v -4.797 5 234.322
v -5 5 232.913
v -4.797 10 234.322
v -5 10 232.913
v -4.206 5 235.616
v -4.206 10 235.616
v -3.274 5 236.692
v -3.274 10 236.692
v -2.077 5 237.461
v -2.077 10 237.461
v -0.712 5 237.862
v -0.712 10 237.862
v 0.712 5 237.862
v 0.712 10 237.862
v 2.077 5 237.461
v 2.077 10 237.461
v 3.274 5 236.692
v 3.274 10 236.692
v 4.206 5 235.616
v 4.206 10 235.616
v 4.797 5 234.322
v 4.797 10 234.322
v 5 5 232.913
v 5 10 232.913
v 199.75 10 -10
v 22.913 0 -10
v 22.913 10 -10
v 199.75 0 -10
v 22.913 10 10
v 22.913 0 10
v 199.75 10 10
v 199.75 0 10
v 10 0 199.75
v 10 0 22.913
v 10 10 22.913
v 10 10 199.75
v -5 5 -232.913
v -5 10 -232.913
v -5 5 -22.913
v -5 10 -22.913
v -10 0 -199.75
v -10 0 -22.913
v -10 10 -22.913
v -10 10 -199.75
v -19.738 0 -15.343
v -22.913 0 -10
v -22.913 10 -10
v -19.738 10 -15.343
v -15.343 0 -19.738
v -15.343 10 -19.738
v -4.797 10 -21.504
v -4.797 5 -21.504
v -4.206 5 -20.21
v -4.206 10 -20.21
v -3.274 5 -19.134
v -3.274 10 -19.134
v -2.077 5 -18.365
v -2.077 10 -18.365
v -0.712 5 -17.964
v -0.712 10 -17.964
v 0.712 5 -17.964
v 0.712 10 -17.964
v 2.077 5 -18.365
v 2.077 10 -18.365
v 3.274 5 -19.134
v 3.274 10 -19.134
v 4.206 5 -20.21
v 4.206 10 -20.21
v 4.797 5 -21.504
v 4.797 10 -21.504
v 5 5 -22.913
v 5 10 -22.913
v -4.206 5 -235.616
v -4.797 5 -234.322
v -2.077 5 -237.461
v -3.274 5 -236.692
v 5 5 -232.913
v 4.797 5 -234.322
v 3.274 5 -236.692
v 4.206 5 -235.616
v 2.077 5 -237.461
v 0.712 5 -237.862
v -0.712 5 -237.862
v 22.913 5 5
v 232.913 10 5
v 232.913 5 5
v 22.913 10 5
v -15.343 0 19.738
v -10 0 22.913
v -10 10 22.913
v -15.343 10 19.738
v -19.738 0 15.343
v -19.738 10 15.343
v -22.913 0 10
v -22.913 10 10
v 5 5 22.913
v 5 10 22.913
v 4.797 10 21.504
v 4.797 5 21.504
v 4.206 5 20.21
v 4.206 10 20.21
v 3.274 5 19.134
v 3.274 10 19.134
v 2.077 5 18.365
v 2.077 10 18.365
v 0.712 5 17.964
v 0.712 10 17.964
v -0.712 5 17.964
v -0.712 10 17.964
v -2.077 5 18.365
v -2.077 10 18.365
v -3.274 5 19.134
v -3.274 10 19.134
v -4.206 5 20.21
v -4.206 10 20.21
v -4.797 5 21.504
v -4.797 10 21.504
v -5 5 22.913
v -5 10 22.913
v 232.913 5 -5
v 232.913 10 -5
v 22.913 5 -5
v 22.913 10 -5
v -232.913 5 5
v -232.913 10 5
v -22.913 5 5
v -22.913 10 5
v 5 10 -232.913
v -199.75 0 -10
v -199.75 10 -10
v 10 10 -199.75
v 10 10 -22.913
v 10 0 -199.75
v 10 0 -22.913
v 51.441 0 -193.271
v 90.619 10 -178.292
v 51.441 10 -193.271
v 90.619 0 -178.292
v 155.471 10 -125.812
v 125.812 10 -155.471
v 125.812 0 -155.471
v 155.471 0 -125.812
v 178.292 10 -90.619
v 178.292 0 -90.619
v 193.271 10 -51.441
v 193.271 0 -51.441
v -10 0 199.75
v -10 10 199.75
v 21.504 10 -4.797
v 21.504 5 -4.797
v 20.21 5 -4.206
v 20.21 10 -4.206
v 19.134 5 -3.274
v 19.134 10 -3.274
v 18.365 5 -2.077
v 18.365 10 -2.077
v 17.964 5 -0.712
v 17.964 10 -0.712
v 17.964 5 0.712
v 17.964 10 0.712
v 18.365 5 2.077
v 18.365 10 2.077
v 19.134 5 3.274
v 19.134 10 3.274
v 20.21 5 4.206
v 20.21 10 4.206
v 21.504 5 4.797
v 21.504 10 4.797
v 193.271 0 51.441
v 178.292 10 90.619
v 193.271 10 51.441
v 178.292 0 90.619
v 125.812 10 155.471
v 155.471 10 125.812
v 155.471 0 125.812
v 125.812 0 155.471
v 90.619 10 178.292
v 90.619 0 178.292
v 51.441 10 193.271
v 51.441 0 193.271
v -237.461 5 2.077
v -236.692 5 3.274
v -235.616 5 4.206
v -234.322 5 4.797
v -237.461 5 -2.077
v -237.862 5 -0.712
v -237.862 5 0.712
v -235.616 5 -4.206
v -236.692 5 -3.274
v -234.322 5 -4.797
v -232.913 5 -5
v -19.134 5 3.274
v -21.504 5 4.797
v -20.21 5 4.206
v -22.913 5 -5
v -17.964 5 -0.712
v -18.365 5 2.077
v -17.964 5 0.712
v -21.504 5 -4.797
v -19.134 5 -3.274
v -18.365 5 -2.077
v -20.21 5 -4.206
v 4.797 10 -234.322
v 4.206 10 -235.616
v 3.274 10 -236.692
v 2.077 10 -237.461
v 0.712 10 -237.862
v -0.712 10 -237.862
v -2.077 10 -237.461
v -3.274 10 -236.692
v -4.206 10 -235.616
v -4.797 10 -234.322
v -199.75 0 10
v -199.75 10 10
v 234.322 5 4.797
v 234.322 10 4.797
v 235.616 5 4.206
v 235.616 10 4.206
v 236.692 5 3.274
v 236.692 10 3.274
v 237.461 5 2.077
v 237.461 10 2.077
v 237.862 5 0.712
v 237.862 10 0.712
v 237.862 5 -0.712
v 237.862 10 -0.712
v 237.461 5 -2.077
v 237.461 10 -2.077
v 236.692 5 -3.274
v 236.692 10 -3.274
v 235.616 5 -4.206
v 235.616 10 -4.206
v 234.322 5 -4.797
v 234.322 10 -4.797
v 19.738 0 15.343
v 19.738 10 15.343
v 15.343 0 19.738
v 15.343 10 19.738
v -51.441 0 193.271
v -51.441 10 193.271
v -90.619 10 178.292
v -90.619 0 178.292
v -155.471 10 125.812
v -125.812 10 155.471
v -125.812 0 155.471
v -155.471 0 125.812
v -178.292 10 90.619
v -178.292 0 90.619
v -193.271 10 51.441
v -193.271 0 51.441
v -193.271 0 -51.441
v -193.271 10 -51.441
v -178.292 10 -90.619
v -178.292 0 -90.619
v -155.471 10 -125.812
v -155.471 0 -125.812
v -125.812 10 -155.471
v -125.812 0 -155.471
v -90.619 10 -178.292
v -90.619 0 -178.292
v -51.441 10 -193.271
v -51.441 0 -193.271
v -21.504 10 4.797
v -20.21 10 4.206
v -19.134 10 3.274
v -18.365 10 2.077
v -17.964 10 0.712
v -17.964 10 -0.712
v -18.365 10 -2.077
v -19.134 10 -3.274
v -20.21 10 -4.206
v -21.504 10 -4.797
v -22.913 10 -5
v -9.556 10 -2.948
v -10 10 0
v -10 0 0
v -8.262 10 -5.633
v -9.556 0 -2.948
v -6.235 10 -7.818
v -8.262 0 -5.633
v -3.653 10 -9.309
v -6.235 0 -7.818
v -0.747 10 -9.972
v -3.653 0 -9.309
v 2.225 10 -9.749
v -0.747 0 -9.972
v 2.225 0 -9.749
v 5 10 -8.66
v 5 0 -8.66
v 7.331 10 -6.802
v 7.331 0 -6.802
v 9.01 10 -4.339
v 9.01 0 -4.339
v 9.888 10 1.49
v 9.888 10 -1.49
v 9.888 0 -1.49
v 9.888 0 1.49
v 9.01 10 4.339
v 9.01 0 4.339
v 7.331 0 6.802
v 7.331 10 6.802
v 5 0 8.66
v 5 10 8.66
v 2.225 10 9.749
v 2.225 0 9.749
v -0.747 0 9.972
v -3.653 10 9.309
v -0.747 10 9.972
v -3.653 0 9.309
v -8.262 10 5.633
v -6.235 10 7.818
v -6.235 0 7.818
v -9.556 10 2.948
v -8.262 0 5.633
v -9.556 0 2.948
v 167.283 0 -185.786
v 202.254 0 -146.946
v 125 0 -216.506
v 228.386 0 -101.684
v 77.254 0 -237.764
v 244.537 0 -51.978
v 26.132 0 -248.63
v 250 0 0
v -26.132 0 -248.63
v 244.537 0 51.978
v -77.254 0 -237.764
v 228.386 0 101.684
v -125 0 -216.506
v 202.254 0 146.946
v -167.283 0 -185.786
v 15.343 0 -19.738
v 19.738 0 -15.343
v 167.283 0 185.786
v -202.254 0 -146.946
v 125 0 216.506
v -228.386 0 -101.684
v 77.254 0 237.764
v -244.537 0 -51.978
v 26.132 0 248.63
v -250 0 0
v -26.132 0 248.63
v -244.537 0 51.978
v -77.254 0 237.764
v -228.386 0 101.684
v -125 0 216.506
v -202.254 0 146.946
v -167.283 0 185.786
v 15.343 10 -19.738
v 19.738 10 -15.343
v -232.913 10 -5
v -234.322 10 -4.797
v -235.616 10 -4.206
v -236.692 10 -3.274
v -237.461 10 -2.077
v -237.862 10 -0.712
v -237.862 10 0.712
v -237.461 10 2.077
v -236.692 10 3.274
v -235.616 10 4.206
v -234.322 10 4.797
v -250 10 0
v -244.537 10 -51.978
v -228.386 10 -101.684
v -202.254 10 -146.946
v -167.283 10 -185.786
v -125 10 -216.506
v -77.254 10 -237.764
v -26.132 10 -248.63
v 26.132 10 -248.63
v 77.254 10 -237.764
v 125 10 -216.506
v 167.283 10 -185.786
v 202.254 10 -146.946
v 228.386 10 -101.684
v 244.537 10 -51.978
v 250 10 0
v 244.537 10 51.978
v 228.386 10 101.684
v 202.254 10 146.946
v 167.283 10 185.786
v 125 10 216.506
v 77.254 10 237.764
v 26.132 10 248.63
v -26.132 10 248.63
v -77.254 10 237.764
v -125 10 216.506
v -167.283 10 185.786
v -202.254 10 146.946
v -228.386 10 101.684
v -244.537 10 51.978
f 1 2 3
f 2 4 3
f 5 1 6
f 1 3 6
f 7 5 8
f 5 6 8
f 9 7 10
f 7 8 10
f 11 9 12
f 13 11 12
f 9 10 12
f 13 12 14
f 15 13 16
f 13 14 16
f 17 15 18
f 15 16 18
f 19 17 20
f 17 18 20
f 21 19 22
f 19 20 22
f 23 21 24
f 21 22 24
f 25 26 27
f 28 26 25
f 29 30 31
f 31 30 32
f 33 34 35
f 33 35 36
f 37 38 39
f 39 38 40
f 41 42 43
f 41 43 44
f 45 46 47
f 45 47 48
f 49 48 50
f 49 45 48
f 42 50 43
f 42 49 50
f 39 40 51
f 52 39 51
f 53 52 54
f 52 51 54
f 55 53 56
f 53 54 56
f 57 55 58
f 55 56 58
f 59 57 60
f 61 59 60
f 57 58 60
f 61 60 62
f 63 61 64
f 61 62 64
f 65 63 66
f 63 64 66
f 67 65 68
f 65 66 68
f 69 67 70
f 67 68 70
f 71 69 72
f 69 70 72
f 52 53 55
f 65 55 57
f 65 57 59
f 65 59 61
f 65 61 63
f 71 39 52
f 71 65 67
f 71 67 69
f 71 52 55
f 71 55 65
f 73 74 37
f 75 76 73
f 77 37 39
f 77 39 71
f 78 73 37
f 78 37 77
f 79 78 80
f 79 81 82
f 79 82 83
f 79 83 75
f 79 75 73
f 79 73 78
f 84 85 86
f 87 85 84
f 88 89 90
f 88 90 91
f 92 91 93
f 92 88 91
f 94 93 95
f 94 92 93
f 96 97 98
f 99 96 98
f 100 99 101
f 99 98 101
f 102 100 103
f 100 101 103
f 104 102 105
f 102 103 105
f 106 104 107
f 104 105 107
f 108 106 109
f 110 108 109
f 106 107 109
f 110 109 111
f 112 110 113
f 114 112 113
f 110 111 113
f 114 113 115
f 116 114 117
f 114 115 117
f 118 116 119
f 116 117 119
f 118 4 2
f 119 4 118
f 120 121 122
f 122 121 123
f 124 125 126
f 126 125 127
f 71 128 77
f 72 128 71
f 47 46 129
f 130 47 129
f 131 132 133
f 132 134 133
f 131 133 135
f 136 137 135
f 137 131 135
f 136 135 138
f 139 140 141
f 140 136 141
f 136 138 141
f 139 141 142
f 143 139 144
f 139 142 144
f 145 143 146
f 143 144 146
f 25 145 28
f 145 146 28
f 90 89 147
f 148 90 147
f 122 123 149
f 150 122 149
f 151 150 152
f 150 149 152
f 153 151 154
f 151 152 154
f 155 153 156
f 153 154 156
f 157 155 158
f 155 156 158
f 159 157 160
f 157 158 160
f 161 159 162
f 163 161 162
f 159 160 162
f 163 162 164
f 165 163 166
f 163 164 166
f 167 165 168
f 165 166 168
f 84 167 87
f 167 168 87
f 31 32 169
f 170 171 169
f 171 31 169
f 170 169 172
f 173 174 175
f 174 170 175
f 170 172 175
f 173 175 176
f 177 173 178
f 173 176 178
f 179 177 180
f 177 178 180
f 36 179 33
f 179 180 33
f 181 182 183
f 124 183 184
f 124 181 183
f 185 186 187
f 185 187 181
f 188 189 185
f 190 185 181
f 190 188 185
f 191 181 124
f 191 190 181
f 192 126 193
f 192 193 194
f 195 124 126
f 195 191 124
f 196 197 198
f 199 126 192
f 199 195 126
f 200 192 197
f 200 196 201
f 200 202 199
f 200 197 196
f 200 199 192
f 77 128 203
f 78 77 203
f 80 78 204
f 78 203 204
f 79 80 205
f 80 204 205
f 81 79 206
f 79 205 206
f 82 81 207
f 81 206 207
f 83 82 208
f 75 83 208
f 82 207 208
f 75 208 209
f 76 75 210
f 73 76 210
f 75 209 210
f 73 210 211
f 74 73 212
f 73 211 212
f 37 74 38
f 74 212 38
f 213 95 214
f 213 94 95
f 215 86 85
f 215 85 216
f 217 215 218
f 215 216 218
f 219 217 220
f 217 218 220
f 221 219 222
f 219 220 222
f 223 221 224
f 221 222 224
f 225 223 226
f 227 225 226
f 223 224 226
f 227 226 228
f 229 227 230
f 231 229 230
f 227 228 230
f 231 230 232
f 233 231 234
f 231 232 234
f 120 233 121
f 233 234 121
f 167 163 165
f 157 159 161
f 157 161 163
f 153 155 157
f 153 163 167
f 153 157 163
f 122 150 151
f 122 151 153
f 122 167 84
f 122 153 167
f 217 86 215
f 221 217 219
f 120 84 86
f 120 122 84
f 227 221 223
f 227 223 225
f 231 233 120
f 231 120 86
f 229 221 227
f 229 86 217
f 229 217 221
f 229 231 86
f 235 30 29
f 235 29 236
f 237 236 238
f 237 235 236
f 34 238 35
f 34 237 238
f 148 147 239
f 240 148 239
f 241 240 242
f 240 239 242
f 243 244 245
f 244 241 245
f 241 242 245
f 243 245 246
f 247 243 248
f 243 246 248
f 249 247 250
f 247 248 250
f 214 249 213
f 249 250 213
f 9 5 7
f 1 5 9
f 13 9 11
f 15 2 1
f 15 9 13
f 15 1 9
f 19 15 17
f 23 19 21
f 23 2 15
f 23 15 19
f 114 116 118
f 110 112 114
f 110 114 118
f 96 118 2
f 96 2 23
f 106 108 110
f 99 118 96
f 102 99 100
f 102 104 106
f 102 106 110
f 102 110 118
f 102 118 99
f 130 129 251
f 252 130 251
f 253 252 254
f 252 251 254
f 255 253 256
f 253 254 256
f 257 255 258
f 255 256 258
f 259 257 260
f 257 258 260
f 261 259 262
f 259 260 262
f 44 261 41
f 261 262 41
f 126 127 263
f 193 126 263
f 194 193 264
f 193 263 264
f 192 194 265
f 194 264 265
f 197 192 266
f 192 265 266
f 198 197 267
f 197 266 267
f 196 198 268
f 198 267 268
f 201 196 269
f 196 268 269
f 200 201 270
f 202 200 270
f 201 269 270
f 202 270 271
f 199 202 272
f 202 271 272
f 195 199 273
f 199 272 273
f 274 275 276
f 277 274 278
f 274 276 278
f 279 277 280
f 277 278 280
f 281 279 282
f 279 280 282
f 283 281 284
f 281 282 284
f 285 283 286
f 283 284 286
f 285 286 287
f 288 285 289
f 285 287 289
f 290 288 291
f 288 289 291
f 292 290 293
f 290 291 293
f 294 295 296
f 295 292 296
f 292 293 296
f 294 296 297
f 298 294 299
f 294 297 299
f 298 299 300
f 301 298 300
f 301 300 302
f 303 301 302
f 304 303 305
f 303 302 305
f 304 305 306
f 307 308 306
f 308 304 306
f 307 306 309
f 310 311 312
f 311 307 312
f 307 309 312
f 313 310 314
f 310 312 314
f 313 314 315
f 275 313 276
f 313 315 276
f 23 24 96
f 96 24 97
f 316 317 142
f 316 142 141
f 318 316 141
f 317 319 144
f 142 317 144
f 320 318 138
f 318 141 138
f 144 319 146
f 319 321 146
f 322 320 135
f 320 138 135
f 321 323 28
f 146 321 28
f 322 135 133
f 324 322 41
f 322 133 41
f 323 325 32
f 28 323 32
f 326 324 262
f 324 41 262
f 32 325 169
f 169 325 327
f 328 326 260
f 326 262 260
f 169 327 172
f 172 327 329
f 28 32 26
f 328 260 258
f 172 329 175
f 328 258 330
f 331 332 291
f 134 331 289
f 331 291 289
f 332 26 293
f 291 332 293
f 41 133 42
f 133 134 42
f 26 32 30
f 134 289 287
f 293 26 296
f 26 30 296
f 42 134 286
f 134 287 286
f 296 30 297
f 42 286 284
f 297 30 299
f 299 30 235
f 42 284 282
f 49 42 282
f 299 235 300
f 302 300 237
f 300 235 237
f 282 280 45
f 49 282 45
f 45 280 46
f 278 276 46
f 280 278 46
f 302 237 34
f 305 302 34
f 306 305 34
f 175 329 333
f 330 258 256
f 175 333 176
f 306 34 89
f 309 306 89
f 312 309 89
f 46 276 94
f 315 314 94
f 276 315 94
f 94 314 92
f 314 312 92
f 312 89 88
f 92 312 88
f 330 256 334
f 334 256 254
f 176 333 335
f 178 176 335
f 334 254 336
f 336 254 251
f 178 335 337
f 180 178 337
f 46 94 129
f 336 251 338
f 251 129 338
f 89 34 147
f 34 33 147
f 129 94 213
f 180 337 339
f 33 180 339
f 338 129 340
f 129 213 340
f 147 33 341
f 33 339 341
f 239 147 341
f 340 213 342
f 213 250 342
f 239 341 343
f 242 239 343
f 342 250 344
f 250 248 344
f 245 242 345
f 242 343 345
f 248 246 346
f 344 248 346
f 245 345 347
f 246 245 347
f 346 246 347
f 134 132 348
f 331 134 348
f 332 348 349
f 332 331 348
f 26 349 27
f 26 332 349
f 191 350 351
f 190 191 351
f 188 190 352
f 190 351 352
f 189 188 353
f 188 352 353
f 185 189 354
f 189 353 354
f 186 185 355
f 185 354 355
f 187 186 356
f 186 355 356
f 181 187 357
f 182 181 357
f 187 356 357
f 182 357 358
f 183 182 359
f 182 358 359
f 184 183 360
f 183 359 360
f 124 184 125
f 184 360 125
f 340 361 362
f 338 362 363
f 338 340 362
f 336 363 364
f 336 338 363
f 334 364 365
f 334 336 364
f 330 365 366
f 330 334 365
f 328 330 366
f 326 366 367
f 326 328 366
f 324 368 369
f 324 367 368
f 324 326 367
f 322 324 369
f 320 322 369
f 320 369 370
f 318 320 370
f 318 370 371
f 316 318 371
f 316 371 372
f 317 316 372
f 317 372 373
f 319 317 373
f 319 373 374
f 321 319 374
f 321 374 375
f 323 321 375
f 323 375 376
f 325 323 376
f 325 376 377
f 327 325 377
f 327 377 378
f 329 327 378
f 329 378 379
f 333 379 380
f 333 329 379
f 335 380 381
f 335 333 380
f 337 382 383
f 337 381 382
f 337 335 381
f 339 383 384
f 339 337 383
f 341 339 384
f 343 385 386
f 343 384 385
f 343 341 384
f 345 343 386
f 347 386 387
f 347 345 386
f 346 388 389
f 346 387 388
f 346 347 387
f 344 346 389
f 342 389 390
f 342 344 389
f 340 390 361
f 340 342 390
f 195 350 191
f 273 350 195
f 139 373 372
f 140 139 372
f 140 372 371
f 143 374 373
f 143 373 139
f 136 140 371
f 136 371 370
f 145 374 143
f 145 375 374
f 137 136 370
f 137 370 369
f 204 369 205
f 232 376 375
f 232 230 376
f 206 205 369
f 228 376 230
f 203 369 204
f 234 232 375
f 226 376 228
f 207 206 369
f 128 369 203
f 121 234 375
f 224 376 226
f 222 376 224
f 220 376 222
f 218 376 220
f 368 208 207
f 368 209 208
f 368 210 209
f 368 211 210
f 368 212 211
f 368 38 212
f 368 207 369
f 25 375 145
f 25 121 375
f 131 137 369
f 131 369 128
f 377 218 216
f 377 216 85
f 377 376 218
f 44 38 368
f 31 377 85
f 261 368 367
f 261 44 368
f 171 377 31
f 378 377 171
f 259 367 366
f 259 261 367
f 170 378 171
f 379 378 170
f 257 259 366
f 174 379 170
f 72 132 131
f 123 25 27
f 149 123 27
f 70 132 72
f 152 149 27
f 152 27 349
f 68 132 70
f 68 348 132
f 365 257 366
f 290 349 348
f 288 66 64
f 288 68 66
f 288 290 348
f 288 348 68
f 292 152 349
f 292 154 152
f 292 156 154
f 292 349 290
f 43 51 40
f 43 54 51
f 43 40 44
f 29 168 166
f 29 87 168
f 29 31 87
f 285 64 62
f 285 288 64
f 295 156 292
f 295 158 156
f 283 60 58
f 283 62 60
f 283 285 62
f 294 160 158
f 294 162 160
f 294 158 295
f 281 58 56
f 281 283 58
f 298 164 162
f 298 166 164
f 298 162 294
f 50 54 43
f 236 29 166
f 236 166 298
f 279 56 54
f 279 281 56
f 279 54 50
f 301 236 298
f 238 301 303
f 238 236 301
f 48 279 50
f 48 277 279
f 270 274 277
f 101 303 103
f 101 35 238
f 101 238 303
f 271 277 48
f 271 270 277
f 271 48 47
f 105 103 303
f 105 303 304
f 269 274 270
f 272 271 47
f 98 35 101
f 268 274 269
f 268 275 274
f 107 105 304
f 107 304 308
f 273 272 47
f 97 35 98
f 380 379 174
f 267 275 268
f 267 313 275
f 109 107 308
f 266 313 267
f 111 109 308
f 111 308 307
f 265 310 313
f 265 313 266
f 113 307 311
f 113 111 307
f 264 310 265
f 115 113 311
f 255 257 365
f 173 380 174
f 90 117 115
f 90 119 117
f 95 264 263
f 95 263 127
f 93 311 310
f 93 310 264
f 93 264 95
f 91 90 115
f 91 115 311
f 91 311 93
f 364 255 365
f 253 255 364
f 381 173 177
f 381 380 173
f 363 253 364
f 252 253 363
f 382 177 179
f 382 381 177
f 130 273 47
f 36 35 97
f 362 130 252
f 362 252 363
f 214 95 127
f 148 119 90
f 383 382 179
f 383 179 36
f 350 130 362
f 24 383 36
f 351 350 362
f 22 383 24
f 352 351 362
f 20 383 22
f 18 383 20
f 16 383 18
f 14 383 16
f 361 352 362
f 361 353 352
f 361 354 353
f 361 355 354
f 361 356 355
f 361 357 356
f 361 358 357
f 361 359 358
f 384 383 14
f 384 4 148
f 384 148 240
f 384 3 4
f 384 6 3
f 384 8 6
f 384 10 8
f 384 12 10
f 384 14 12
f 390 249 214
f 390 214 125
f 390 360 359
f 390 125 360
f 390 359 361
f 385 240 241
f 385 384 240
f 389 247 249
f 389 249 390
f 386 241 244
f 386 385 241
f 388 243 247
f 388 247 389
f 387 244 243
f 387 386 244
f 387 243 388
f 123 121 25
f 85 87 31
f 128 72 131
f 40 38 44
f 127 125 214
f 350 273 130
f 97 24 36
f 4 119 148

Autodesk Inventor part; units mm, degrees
ref_plane "YZ Plane" through (0, 0, 0) normal (1, 0, 0) x (0, 1, 0)
ref_plane "XZ Plane" through (0, 0, 0) normal (0, 1, 0) x (-1, 0, 0)
ref_plane "XY Plane" through (0, 0, 0) normal (0, 0, 1) x (1, 0, 0)
sketch "Skizze1" plane through (0, 0, 0) normal (0, 1, 0) x (-1, 0, 0)
  circle A0 centre (0, 0) radius 10
  circle A1 centre (0, 0) radius 250
  circle A2 centre (0, 0) radius 200
  circle A3 centre (0, 0) radius 25
  line L0 (10, 0) -> (10, -249.7999)
  line L1 (-10, 0) -> (-10, -249.7999)
  line L2 (0, 10) -> (249.7999, 10)
  line L3 (0, -10) -> (249.7999, -10)
  line L4 (10, 0) -> (10, 249.7999)
  line L5 (-10, 0) -> (-10, 249.7999)
  line L6 (0, 10) -> (-199.7498, 10)
  line L7 (0, -10) -> (-199.7498, -10)
  point P0 (-10, -199.7498)
  point P1 (-22.9129, -10)
  point P2 (-10, -22.9129)
  point P3 (10, -199.7498)
  point P4 (10, -22.9129)
  point P5 (22.9129, -10)
  point P6 (199.7498, -10)
  point P7 (-10, 199.7498)
  point P8 (-10, 22.9129)
  point P9 (-22.9129, 10)
  point P10 (22.9129, 10)
  point P11 (10, 22.9129)
  point P12 (10, 199.7498)
  point P13 (199.7498, 10)
  dimension "d0" = 20
  dimension "d1" = 500
  dimension "d2" = 400
  dimension "d3" = 50
extrude "Extrusion1" add sketch "Skizze1" along normal blind 10 contours L0 L3 A0 | L4 L2 A3 L3 L0 | A0 L2 L4 | L6 L5 A3 L4 L2 | A0 L5 L6 | L7 L1 A0 | L3 L0 A3 L1 L7 | L3 A3 L0 | L4 A3 L2 | L1 L7 A3 L6 L5 | L6 A3 L5 | L1 A3 L7 | L0 A2 L1 A3 | A3 L2 A2 L3 | A3 L5 A2 L4 | A3 L7 A2 L6 | L0 A1 L1 A2 | A2 L3 A1 L0 | A2 L2 A1 L3 | A2 L4 A1 L2 | A2 L5 A1 L4 | A2 L1 A1 L5
sketch "Skizze2" plane through (0, 10, 0) normal (0, 1, 0) x (1, 0, 0)
  line L0 (0, 22.9129) -> (0, 232.9129)
  circle A0 centre (0, 232.9129) radius 5
  circle A1 centre (0, 22.9129) radius 5
  line L1 (5, 232.9129) -> (5, 22.9129)
  line L2 (-5, 232.9129) -> (-5, 22.9129)
  line L3 (22.9129, 0) -> (232.9129, 0)
  circle A2 centre (232.9129, 0) radius 5
  circle A3 centre (22.9129, 0) radius 5
  line L4 (232.9129, -5) -> (22.9129, -5)
  line L5 (232.9129, 5) -> (22.9129, 5)
  line L6 (0, -22.9129) -> (0, -232.9129)
  circle A4 centre (0, -232.9129) radius 5
  circle A5 centre (0, -22.9129) radius 5
  line L7 (-5, -232.9129) -> (-5, -22.9129)
  line L8 (5, -232.9129) -> (5, -22.9129)
  line L9 (-22.9129, 0) -> (-232.9129, 0)
  circle A6 centre (-232.9129, 0) radius 5
  circle A7 centre (-22.9129, 0) radius 5
  line L10 (-232.9129, 5) -> (-22.9129, 5)
  line L11 (-232.9129, -5) -> (-22.9129, -5)
  point P0 (0, 0)
  point P1 (0, 0)
  point P2 (0, 0)
  point P3 (0, 0)
  dimension "nutlange" = 210
  dimension "radius" = 10
  dimension "d10" = 10
  dimension "d13" = 360
extrude "Extrusion2" cut sketch "Skizze2" against normal blind 5
properties part number "Seitenscheibe" material "PVC, hart"
